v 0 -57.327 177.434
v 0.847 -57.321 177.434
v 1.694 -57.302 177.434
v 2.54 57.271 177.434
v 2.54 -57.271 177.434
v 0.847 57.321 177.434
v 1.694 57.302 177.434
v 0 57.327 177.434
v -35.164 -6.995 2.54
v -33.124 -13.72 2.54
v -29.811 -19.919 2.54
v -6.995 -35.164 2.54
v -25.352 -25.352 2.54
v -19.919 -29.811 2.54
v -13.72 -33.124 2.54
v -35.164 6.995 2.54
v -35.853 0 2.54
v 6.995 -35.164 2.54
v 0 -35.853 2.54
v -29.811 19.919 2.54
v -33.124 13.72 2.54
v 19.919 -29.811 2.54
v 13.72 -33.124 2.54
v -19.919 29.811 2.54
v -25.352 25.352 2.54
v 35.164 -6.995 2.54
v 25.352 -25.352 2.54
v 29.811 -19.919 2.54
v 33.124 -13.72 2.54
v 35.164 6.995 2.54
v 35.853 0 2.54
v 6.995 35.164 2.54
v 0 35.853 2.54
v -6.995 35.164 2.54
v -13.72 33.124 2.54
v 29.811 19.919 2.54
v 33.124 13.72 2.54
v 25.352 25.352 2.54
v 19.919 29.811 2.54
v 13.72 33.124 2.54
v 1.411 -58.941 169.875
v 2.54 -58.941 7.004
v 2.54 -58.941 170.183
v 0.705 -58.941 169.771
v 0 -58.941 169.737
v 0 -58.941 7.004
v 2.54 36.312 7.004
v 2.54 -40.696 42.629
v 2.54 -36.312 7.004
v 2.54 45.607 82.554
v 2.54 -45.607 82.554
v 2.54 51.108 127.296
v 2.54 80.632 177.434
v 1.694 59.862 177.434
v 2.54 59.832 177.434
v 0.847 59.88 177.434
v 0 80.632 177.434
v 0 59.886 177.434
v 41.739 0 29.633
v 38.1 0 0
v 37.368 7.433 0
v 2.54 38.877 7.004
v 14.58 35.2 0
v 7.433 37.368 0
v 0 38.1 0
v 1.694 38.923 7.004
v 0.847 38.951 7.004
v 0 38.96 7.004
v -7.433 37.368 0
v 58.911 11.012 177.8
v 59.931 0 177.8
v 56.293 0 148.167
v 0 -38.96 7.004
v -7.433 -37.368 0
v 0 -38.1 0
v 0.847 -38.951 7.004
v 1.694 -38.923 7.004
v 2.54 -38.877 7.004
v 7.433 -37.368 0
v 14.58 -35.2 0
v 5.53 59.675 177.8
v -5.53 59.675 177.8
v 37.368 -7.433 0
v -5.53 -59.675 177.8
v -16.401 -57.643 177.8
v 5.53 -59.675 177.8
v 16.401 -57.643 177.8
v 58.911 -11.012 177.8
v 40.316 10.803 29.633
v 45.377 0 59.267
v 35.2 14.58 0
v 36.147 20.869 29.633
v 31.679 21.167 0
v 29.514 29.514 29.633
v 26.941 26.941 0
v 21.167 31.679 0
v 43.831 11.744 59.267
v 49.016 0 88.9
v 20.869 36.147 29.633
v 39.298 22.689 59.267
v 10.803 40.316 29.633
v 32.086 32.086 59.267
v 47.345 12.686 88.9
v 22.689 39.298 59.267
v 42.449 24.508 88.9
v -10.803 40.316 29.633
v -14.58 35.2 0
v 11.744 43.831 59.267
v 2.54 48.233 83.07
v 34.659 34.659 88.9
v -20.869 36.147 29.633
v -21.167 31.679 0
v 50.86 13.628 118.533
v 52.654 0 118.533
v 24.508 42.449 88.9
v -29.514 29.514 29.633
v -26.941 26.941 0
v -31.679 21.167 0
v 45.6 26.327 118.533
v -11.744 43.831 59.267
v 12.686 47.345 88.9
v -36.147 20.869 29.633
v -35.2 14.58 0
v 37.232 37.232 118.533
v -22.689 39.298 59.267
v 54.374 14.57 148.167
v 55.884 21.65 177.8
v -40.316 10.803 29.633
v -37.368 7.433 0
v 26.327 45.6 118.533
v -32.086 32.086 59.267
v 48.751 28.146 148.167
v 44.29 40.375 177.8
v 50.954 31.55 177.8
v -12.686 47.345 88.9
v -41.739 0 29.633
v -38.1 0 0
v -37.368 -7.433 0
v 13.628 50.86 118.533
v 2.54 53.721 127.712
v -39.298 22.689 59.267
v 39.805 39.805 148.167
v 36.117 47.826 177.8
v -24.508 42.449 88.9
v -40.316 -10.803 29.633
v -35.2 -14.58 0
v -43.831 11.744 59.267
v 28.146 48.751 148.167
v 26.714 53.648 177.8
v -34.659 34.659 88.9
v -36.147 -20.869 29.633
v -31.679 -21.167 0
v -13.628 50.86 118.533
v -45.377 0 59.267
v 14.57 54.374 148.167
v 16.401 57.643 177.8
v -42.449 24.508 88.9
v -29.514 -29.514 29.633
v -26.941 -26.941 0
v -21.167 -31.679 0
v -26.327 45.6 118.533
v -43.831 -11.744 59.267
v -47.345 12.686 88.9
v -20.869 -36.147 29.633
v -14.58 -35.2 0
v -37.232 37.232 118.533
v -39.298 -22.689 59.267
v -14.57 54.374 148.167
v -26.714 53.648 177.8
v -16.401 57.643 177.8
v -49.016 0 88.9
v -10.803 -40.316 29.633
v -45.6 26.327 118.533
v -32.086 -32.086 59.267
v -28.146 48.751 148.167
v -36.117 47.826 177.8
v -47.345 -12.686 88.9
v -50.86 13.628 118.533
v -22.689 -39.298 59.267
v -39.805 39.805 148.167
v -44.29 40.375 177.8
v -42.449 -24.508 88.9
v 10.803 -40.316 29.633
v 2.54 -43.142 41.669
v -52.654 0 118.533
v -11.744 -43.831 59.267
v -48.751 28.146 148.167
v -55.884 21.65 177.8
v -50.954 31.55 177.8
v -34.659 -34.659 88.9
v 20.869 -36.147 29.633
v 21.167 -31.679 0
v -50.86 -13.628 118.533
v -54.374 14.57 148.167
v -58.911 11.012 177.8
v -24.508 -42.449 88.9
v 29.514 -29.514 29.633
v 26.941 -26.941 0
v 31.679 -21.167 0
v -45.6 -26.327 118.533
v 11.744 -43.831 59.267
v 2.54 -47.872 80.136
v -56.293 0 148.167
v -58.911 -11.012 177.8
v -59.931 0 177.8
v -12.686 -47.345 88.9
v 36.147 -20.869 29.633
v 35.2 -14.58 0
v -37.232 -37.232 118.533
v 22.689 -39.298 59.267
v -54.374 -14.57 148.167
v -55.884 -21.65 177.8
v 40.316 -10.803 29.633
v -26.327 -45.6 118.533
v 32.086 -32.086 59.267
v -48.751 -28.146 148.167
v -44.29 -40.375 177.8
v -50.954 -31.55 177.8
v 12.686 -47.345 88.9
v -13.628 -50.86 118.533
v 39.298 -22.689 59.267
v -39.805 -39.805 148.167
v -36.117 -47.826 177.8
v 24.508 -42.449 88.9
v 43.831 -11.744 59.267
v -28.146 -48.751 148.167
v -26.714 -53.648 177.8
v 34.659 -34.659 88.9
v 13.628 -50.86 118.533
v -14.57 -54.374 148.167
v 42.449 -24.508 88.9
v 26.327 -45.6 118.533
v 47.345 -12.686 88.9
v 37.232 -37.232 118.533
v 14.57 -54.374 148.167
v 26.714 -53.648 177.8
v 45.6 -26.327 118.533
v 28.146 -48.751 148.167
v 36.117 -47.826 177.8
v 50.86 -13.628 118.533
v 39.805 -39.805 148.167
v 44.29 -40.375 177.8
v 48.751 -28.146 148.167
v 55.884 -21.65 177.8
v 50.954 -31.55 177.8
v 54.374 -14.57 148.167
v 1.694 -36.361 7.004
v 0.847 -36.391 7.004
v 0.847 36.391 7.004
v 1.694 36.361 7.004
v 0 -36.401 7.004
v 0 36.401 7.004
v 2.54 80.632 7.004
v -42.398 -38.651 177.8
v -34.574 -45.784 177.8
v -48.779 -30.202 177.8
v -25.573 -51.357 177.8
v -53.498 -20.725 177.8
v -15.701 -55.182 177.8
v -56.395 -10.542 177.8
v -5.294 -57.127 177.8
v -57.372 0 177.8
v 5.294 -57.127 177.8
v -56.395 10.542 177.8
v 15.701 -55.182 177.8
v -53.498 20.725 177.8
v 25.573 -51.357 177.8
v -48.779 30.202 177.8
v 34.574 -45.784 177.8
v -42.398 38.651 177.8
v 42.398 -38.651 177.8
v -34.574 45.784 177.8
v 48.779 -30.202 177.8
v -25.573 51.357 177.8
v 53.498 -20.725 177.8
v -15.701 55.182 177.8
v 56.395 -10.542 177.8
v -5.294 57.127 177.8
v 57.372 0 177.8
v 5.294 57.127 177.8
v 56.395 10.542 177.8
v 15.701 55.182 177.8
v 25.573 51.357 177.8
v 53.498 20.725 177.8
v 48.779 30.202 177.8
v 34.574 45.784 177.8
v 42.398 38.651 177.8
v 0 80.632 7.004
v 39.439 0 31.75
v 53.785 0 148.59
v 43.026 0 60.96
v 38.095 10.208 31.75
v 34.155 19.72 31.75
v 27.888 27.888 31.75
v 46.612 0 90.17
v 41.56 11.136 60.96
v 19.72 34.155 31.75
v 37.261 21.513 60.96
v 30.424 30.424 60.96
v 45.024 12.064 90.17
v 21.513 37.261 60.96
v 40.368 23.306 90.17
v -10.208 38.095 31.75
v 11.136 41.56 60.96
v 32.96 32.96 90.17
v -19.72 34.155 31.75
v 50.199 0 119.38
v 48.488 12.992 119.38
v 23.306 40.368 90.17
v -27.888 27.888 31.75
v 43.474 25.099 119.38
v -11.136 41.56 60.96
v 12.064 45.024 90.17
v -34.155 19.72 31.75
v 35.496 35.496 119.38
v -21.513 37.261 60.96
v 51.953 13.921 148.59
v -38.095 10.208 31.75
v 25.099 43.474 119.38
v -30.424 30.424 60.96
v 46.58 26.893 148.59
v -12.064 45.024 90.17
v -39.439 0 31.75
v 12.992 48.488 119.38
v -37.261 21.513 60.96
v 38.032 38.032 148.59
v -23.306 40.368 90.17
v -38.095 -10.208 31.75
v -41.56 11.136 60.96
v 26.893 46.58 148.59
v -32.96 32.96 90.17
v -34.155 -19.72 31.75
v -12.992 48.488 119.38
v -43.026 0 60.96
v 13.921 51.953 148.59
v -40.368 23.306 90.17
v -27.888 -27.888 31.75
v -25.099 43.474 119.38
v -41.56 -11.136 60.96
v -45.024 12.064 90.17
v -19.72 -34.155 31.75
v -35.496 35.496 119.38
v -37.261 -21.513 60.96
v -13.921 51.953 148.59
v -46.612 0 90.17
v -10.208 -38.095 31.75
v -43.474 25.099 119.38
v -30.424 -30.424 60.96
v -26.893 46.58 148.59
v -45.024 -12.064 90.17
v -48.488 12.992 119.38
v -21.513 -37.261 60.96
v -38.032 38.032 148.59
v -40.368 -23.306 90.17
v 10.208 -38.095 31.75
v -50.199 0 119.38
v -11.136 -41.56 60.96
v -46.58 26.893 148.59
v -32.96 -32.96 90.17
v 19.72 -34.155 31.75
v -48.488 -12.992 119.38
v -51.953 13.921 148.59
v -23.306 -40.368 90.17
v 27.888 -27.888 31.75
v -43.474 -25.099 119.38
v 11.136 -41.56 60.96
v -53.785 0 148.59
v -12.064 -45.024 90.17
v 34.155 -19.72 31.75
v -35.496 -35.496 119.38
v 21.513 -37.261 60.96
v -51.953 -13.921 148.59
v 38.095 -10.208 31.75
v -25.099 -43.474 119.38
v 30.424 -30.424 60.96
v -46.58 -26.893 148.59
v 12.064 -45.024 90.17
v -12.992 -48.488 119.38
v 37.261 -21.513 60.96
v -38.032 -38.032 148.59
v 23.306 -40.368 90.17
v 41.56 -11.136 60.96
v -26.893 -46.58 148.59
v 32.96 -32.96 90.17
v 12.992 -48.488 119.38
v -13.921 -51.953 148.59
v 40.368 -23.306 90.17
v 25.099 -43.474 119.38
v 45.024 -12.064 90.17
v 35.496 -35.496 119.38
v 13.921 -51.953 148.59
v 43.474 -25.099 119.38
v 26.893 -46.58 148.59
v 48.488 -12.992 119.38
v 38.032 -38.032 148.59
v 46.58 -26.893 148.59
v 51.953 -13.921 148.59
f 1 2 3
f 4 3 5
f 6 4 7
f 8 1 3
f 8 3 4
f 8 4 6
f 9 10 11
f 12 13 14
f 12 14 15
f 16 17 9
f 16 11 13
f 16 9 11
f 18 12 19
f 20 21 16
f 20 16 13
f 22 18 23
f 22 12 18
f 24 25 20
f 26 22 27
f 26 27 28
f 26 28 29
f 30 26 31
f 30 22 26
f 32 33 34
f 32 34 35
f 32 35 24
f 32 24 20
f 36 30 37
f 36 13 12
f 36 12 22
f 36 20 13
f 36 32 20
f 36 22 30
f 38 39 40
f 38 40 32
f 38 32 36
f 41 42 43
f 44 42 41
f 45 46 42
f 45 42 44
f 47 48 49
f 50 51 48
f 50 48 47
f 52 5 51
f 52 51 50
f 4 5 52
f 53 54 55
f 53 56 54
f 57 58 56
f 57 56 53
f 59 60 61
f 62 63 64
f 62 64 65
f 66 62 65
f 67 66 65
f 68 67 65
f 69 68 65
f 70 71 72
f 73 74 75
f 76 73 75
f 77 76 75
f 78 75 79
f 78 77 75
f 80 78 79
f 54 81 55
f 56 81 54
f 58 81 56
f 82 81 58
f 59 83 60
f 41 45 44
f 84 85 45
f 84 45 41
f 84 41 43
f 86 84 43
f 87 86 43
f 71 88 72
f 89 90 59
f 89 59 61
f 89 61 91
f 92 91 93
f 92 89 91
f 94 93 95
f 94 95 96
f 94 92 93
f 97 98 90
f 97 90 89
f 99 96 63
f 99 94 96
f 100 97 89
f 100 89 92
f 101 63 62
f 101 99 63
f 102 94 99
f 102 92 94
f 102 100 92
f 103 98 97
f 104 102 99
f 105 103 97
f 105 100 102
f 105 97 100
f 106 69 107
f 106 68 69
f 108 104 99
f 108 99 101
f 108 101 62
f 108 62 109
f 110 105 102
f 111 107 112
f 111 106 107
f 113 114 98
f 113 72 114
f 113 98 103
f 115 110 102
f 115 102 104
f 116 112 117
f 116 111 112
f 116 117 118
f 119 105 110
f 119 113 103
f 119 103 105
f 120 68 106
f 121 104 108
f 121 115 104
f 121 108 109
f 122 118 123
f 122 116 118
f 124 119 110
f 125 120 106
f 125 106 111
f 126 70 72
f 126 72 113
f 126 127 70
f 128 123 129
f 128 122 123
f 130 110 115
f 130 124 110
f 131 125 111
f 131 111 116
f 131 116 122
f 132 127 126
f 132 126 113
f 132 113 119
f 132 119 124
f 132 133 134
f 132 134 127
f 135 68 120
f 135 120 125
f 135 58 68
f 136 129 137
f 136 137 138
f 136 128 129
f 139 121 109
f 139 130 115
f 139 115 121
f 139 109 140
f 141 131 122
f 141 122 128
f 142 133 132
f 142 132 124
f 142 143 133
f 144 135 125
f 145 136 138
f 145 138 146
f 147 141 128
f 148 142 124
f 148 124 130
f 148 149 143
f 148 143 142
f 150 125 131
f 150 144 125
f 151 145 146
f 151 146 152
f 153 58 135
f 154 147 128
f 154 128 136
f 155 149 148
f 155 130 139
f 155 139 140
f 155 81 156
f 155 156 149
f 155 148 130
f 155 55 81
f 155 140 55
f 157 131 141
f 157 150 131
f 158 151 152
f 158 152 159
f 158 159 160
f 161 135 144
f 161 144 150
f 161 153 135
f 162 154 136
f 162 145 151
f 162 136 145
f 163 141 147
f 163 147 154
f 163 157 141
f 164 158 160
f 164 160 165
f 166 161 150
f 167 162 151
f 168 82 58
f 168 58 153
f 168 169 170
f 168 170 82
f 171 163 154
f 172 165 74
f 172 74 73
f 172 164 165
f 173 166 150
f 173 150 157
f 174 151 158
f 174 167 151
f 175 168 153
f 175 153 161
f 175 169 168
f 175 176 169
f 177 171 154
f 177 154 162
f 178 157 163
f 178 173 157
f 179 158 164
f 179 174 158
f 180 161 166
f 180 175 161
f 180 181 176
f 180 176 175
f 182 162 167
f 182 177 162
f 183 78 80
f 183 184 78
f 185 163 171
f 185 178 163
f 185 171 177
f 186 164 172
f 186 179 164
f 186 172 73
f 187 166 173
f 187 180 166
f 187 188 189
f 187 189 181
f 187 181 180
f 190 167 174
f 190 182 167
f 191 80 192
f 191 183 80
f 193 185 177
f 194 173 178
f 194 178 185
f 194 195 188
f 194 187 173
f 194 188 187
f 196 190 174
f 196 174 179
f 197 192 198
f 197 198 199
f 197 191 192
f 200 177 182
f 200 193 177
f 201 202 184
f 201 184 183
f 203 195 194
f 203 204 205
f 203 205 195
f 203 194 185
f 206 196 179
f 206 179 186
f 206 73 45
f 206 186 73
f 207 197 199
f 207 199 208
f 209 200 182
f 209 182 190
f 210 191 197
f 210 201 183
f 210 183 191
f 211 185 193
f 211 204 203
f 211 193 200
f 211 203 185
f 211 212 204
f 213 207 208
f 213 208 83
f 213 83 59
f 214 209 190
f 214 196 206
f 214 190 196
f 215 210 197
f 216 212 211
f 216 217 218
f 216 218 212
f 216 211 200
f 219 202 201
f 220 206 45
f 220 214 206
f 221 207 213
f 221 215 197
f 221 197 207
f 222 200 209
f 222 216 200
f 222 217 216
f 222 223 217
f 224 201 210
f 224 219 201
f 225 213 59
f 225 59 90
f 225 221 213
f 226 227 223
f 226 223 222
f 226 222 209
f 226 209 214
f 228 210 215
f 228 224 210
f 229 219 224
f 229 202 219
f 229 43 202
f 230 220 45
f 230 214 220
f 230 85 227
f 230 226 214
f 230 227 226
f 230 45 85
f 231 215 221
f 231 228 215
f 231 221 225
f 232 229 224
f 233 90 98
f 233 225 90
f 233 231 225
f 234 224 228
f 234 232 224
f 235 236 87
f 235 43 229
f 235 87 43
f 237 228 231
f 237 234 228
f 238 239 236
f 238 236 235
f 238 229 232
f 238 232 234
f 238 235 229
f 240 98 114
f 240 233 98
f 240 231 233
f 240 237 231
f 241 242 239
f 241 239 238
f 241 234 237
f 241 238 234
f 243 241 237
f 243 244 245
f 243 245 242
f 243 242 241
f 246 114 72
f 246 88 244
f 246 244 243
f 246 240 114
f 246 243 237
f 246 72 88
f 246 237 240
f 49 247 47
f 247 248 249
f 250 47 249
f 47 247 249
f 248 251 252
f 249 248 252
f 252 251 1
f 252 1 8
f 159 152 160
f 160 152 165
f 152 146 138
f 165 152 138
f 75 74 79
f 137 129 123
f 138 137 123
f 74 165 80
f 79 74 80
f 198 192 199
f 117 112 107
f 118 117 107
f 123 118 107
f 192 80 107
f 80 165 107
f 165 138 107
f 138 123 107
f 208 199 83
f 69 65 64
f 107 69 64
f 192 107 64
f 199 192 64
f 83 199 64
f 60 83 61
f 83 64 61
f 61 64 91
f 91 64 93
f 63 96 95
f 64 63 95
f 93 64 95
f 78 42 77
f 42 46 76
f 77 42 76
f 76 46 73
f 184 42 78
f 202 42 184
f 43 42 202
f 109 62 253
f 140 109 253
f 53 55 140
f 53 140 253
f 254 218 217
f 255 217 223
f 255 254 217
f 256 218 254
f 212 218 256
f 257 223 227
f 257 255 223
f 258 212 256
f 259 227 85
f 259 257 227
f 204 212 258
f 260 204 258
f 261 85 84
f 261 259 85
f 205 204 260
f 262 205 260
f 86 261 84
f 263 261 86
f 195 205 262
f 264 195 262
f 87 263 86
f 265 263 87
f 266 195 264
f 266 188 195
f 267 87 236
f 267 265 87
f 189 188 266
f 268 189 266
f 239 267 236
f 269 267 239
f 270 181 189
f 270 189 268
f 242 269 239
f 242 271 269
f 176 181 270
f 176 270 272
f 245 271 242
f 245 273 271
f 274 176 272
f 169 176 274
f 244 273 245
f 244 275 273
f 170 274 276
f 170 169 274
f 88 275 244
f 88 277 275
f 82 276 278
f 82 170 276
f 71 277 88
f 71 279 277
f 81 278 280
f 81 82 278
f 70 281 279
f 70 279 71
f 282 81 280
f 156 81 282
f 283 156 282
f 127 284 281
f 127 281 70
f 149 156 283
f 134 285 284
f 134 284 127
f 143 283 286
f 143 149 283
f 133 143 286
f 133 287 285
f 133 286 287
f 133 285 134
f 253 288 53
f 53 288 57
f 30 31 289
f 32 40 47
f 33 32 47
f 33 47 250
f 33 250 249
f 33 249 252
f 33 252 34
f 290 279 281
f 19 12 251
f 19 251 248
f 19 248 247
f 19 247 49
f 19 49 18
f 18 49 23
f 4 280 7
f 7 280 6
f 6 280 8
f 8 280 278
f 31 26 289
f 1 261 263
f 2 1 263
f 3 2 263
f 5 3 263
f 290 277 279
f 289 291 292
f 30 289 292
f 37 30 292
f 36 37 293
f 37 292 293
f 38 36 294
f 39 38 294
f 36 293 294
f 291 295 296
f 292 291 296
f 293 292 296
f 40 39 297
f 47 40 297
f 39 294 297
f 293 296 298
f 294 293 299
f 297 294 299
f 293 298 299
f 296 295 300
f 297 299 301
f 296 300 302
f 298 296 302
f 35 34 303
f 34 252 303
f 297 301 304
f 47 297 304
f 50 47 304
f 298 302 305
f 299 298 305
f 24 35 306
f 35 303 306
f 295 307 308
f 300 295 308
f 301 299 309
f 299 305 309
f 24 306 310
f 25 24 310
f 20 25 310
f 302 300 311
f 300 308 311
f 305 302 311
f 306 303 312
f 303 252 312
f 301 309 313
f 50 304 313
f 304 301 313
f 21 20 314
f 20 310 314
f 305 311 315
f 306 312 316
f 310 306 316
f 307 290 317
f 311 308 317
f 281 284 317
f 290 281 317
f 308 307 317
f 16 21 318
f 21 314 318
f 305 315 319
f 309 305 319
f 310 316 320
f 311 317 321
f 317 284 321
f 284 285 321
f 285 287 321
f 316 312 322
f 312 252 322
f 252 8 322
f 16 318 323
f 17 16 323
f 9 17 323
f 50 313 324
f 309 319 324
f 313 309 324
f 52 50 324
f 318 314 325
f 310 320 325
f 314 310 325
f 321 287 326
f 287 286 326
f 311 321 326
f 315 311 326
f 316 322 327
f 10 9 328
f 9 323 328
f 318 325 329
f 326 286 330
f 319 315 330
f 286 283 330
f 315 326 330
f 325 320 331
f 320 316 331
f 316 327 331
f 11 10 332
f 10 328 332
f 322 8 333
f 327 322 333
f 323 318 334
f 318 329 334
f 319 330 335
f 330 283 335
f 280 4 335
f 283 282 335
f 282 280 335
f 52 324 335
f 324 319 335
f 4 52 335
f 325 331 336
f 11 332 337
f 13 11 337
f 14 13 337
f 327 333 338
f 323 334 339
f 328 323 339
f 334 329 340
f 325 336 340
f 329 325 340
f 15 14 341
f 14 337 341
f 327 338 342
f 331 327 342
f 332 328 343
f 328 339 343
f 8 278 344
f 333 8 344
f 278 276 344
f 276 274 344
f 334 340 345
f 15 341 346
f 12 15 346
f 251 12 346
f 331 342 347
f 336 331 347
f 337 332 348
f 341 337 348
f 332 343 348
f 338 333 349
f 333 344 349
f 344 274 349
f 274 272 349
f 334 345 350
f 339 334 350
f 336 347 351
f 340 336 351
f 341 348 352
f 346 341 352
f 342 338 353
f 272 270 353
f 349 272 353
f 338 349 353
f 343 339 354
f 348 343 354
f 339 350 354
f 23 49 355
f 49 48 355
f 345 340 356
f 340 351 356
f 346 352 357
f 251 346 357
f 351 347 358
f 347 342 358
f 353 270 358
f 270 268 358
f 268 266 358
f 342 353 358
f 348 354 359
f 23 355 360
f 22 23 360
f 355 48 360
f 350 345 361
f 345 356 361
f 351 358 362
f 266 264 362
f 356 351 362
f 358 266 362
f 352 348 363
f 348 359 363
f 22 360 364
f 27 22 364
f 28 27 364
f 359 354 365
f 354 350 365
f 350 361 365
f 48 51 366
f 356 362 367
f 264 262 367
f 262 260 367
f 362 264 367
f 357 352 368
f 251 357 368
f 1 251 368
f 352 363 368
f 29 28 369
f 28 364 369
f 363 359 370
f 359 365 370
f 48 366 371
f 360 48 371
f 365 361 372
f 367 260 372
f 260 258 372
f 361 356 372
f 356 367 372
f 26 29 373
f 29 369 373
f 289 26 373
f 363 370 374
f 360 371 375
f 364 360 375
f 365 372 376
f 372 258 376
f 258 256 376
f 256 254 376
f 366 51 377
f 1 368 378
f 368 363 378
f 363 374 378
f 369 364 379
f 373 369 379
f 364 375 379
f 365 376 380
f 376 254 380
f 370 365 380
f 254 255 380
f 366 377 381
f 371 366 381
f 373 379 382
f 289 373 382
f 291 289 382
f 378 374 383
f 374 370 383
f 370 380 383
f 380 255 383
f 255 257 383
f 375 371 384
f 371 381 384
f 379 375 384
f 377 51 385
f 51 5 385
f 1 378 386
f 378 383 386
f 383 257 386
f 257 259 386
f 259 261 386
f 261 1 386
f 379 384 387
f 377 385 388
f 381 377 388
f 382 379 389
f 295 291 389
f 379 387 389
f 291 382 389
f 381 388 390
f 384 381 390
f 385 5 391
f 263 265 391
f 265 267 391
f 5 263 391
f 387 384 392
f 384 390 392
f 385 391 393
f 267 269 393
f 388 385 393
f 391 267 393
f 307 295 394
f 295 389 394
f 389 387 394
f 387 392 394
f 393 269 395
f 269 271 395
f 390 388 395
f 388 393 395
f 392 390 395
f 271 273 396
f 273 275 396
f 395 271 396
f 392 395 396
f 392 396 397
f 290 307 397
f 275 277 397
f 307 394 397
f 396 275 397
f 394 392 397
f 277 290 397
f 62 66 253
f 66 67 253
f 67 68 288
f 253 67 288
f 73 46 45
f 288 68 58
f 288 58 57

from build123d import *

# Parameters (mm, degrees)
F0_R     = 38.1
F1_DEPTH = 177.8
F1_TAPER = -7
F2_T     = -2.54
F3_W     = 139.5735256374
F3_H     = 170.4298052937
F4_DEPTH = 2.54


# Not quite as in the source:
# - a feature names something its author has since deleted; it is built from what else it names


with BuildPart() as f1:
    # F0 (on Top) → F1 (new body)
    with BuildSketch(Plane.XY):
        Circle(F0_R)
    extrude(amount=F1_DEPTH, taper=F1_TAPER)

    # F2
    f2_openings = [f1.faces().sort_by_distance(p)[0] for p in [
        (0, 0, 177.8),
    ]]
    offset(amount=F2_T, openings=f2_openings, kind=Kind.INTERSECTION)

    # F3 (on Right) → F4 (join)
    with BuildSketch(Plane.YZ):
        with Locations((10.8456704766, 92.2188116238)):
            Rectangle(F3_W, F3_H)
    extrude(amount=F4_DEPTH)


solid = f1.part
